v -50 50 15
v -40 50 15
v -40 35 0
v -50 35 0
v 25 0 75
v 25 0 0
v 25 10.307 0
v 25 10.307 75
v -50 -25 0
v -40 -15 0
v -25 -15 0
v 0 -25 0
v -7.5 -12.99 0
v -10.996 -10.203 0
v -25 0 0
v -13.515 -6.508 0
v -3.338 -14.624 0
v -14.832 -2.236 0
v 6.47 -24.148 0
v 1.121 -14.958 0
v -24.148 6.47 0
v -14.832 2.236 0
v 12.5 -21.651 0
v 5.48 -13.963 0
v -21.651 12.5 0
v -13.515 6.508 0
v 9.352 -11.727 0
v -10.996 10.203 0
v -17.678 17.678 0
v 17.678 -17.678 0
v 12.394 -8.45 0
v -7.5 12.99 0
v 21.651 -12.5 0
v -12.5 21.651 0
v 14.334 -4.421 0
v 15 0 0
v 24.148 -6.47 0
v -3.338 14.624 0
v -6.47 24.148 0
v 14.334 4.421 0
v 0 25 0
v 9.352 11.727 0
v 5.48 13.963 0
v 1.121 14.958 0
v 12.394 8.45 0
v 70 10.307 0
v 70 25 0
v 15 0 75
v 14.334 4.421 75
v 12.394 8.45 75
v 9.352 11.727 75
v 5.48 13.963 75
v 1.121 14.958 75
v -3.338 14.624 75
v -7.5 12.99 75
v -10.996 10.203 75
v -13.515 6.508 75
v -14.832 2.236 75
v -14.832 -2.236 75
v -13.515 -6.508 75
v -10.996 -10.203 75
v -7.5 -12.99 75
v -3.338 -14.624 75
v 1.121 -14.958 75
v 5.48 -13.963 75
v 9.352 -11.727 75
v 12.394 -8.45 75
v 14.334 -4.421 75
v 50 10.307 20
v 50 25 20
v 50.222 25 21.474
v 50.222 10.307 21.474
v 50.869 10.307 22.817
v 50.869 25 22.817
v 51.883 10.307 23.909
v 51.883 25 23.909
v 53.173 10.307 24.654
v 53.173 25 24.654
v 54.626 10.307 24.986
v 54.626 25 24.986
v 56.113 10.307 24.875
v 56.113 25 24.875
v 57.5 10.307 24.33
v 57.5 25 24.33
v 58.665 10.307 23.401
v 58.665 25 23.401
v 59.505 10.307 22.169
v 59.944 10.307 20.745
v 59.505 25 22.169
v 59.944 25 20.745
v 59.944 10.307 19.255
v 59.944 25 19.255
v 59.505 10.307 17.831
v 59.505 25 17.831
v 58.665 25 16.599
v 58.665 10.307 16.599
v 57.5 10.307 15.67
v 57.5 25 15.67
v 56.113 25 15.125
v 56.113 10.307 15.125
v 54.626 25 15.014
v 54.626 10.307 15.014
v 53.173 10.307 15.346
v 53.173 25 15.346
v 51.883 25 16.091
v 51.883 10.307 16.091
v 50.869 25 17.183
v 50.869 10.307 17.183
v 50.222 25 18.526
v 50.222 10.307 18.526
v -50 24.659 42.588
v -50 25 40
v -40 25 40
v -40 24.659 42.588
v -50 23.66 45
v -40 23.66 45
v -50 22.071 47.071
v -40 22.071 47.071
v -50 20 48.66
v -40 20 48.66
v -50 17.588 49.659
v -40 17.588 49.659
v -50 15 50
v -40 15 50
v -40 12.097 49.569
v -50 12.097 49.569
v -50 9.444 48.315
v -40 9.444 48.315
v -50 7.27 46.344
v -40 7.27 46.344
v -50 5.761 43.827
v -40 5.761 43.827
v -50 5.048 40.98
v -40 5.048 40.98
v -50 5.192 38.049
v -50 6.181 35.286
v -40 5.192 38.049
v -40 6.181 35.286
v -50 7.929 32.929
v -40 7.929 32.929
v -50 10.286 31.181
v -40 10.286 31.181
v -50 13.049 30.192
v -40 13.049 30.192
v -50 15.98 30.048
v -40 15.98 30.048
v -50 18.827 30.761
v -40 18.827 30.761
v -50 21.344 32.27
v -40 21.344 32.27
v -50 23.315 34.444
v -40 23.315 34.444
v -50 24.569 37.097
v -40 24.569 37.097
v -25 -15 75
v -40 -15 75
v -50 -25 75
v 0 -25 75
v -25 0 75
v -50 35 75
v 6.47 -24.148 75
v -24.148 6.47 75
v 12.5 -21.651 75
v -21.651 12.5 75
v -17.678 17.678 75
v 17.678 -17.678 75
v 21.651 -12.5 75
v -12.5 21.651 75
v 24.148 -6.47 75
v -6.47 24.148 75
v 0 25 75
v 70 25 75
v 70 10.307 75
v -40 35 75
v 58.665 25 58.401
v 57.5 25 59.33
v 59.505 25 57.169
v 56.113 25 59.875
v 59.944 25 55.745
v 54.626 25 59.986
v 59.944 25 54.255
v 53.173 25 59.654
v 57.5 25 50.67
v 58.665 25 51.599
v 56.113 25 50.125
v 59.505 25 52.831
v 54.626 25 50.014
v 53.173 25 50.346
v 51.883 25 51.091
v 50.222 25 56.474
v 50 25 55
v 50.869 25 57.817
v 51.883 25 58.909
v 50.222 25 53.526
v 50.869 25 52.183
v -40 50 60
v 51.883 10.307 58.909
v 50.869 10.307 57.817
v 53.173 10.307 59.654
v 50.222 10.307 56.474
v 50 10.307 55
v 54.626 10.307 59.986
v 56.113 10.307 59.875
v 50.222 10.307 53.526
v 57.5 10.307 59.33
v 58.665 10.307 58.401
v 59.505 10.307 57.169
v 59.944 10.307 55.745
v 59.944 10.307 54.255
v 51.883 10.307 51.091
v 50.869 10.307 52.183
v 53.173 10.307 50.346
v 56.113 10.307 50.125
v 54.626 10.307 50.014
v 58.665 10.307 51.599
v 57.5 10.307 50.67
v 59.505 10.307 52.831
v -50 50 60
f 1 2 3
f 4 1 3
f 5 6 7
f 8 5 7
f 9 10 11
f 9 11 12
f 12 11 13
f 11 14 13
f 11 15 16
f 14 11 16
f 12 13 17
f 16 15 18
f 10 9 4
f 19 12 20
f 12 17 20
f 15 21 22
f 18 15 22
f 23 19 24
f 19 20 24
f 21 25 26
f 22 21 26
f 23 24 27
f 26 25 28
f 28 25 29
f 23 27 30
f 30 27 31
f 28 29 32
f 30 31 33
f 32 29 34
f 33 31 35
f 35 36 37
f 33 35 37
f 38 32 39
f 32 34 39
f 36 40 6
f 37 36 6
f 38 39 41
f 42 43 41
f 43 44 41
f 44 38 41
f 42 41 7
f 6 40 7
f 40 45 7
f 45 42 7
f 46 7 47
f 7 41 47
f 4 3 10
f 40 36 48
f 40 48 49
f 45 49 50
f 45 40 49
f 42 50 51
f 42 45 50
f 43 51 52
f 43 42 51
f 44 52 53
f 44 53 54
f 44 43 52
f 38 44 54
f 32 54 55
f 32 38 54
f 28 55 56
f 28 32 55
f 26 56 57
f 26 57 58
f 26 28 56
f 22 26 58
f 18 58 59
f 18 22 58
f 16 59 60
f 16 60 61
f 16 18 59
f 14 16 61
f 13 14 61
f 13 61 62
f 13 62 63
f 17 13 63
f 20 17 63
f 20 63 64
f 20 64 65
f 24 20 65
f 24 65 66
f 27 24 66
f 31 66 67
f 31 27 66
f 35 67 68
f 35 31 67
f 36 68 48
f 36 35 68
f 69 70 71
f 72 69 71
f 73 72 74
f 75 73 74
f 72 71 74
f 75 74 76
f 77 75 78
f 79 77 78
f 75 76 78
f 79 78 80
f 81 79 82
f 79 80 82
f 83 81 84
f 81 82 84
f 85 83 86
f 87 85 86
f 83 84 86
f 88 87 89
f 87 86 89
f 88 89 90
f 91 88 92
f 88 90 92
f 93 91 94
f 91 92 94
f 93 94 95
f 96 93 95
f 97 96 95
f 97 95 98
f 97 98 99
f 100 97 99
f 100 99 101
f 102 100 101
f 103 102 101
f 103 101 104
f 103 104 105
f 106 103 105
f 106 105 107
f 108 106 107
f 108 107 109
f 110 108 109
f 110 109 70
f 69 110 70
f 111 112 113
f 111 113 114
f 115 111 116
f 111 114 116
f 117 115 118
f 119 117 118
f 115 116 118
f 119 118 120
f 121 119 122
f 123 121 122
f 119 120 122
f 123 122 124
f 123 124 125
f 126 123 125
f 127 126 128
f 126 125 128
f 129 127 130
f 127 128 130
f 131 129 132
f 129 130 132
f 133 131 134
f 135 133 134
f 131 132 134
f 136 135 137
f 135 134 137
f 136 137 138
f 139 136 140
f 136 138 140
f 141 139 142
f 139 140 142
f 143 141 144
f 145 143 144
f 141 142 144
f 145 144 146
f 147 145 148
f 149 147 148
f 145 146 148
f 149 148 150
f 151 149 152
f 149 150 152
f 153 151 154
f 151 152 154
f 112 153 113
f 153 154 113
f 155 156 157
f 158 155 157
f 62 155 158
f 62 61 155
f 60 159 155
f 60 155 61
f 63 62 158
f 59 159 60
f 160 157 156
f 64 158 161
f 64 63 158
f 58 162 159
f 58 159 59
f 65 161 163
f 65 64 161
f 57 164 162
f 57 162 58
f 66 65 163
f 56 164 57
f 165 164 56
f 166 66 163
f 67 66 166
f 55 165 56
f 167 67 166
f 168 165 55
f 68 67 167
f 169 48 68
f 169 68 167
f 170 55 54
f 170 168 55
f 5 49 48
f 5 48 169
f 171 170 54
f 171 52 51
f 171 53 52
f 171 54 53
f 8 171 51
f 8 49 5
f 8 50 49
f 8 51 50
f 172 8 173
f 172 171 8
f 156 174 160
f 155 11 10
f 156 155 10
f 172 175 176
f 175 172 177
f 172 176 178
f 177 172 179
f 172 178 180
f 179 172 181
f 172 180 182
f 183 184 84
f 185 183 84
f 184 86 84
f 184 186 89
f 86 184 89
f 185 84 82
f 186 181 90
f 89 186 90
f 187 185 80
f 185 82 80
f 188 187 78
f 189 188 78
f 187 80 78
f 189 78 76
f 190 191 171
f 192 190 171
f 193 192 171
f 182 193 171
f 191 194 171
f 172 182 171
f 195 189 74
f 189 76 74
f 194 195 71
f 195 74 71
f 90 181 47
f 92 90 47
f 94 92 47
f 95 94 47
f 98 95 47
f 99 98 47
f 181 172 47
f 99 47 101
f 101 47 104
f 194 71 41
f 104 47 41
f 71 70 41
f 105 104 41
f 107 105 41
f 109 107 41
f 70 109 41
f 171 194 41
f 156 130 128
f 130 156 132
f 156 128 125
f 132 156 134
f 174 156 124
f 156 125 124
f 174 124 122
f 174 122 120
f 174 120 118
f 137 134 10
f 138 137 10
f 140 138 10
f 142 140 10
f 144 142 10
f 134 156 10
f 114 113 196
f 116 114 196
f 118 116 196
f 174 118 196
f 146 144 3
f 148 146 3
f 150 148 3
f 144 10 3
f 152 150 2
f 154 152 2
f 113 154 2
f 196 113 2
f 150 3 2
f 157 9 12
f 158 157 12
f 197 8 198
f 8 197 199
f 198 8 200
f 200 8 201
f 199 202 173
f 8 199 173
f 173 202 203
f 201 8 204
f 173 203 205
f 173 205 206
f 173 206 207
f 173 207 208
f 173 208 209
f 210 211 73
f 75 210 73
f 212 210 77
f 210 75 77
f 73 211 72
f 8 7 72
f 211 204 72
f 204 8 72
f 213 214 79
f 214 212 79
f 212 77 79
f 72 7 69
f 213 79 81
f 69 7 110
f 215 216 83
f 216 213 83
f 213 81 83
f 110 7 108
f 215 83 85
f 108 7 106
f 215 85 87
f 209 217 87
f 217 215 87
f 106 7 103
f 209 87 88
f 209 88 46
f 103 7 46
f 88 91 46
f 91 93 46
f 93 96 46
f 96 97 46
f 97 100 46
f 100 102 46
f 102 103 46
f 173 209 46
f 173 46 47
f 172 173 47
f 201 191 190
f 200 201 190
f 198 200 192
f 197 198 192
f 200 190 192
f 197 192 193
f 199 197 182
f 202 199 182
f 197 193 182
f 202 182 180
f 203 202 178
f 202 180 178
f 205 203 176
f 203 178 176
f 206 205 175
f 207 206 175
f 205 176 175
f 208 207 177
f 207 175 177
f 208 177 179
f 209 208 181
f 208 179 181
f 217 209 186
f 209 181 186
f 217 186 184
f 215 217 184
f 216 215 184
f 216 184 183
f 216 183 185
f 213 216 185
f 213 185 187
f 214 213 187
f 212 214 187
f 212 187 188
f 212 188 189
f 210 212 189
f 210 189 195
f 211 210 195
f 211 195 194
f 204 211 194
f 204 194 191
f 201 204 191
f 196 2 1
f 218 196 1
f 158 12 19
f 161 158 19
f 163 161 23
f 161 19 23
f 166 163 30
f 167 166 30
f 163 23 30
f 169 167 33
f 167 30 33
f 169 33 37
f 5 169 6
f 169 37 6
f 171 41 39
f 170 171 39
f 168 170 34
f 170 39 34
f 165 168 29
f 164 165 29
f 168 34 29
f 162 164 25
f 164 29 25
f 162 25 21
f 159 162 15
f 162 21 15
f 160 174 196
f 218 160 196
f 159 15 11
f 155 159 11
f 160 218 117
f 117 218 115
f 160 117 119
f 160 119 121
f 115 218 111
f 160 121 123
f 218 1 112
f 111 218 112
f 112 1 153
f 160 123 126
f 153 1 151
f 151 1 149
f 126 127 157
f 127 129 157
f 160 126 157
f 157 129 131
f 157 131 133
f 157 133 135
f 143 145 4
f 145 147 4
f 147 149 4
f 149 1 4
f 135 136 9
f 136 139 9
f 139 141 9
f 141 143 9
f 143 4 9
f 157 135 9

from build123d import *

# Parameters (mm, degrees)
F0_R     = 15
F1_DEPTH = 75
F2_R     = 5
F3_DEPTH = 15
F5_DEPTH = 10
F7_DEPTH = 10


with BuildPart() as f1:
    # F0 (on Top) → F1 (new body)
    with BuildSketch(Plane.XY):
        with BuildLine():
            Line((-50, -25), (0, -25))
            ThreePointArc((0, -25), (17.6776695297, -17.6776695297), (25, 0))
            Line((25, 0), (25, 10.3068929166))
            Line((25, 10.3068929166), (70, 10.3068929166))
            Line((70, 10.3068929166), (70, 25))
            Line((70, 25), (0, 25))
            ThreePointArc((0, 25), (-17.6776695297, 17.6776695297), (-25, 0))
            Line((-25, 0), (-25, -15))
            Line((-25, -15), (-40, -15))
            Line((-40, -15), (-40, 50))
            Line((-40, 50), (-50, 50))
            Line((-50, 50), (-50, -25))
        make_face()
        Circle(F0_R, mode=Mode.SUBTRACT)
    extrude(amount=F1_DEPTH)

    # F2 (on face) → F3 (cut)
    with BuildSketch(Plane(origin=(0, 25, 0), x_dir=(-1, 0, 0), z_dir=(0, 1, 0))):
        with Locations((-55, 20)):
            Circle(F2_R)
        with Locations((-55, 55)):
            Circle(F2_R)
    extrude(amount=-F3_DEPTH, mode=Mode.SUBTRACT)

    # F4 (on face) → F5 (cut)
    with BuildSketch(Plane.YZ.offset(-40)):
        with BuildLine():
            ThreePointArc((25, 40), (22.0710678119, 47.0710678119), (15, 50))
            ThreePointArc((15, 50), (7.9289321881, 32.9289321881), (25, 40))
        make_face()
    extrude(amount=-F5_DEPTH, mode=Mode.SUBTRACT)

    # F6 (on face) → F7 (cut)
    with BuildSketch(Plane.YZ.offset(-40)):
        Polygon((35, 75), (50, 60), (50, 75), align=None)
        Polygon((50, 0), (50, 15), (35, 0), align=None)
    extrude(amount=-F7_DEPTH, mode=Mode.SUBTRACT)


solid = f1.part
